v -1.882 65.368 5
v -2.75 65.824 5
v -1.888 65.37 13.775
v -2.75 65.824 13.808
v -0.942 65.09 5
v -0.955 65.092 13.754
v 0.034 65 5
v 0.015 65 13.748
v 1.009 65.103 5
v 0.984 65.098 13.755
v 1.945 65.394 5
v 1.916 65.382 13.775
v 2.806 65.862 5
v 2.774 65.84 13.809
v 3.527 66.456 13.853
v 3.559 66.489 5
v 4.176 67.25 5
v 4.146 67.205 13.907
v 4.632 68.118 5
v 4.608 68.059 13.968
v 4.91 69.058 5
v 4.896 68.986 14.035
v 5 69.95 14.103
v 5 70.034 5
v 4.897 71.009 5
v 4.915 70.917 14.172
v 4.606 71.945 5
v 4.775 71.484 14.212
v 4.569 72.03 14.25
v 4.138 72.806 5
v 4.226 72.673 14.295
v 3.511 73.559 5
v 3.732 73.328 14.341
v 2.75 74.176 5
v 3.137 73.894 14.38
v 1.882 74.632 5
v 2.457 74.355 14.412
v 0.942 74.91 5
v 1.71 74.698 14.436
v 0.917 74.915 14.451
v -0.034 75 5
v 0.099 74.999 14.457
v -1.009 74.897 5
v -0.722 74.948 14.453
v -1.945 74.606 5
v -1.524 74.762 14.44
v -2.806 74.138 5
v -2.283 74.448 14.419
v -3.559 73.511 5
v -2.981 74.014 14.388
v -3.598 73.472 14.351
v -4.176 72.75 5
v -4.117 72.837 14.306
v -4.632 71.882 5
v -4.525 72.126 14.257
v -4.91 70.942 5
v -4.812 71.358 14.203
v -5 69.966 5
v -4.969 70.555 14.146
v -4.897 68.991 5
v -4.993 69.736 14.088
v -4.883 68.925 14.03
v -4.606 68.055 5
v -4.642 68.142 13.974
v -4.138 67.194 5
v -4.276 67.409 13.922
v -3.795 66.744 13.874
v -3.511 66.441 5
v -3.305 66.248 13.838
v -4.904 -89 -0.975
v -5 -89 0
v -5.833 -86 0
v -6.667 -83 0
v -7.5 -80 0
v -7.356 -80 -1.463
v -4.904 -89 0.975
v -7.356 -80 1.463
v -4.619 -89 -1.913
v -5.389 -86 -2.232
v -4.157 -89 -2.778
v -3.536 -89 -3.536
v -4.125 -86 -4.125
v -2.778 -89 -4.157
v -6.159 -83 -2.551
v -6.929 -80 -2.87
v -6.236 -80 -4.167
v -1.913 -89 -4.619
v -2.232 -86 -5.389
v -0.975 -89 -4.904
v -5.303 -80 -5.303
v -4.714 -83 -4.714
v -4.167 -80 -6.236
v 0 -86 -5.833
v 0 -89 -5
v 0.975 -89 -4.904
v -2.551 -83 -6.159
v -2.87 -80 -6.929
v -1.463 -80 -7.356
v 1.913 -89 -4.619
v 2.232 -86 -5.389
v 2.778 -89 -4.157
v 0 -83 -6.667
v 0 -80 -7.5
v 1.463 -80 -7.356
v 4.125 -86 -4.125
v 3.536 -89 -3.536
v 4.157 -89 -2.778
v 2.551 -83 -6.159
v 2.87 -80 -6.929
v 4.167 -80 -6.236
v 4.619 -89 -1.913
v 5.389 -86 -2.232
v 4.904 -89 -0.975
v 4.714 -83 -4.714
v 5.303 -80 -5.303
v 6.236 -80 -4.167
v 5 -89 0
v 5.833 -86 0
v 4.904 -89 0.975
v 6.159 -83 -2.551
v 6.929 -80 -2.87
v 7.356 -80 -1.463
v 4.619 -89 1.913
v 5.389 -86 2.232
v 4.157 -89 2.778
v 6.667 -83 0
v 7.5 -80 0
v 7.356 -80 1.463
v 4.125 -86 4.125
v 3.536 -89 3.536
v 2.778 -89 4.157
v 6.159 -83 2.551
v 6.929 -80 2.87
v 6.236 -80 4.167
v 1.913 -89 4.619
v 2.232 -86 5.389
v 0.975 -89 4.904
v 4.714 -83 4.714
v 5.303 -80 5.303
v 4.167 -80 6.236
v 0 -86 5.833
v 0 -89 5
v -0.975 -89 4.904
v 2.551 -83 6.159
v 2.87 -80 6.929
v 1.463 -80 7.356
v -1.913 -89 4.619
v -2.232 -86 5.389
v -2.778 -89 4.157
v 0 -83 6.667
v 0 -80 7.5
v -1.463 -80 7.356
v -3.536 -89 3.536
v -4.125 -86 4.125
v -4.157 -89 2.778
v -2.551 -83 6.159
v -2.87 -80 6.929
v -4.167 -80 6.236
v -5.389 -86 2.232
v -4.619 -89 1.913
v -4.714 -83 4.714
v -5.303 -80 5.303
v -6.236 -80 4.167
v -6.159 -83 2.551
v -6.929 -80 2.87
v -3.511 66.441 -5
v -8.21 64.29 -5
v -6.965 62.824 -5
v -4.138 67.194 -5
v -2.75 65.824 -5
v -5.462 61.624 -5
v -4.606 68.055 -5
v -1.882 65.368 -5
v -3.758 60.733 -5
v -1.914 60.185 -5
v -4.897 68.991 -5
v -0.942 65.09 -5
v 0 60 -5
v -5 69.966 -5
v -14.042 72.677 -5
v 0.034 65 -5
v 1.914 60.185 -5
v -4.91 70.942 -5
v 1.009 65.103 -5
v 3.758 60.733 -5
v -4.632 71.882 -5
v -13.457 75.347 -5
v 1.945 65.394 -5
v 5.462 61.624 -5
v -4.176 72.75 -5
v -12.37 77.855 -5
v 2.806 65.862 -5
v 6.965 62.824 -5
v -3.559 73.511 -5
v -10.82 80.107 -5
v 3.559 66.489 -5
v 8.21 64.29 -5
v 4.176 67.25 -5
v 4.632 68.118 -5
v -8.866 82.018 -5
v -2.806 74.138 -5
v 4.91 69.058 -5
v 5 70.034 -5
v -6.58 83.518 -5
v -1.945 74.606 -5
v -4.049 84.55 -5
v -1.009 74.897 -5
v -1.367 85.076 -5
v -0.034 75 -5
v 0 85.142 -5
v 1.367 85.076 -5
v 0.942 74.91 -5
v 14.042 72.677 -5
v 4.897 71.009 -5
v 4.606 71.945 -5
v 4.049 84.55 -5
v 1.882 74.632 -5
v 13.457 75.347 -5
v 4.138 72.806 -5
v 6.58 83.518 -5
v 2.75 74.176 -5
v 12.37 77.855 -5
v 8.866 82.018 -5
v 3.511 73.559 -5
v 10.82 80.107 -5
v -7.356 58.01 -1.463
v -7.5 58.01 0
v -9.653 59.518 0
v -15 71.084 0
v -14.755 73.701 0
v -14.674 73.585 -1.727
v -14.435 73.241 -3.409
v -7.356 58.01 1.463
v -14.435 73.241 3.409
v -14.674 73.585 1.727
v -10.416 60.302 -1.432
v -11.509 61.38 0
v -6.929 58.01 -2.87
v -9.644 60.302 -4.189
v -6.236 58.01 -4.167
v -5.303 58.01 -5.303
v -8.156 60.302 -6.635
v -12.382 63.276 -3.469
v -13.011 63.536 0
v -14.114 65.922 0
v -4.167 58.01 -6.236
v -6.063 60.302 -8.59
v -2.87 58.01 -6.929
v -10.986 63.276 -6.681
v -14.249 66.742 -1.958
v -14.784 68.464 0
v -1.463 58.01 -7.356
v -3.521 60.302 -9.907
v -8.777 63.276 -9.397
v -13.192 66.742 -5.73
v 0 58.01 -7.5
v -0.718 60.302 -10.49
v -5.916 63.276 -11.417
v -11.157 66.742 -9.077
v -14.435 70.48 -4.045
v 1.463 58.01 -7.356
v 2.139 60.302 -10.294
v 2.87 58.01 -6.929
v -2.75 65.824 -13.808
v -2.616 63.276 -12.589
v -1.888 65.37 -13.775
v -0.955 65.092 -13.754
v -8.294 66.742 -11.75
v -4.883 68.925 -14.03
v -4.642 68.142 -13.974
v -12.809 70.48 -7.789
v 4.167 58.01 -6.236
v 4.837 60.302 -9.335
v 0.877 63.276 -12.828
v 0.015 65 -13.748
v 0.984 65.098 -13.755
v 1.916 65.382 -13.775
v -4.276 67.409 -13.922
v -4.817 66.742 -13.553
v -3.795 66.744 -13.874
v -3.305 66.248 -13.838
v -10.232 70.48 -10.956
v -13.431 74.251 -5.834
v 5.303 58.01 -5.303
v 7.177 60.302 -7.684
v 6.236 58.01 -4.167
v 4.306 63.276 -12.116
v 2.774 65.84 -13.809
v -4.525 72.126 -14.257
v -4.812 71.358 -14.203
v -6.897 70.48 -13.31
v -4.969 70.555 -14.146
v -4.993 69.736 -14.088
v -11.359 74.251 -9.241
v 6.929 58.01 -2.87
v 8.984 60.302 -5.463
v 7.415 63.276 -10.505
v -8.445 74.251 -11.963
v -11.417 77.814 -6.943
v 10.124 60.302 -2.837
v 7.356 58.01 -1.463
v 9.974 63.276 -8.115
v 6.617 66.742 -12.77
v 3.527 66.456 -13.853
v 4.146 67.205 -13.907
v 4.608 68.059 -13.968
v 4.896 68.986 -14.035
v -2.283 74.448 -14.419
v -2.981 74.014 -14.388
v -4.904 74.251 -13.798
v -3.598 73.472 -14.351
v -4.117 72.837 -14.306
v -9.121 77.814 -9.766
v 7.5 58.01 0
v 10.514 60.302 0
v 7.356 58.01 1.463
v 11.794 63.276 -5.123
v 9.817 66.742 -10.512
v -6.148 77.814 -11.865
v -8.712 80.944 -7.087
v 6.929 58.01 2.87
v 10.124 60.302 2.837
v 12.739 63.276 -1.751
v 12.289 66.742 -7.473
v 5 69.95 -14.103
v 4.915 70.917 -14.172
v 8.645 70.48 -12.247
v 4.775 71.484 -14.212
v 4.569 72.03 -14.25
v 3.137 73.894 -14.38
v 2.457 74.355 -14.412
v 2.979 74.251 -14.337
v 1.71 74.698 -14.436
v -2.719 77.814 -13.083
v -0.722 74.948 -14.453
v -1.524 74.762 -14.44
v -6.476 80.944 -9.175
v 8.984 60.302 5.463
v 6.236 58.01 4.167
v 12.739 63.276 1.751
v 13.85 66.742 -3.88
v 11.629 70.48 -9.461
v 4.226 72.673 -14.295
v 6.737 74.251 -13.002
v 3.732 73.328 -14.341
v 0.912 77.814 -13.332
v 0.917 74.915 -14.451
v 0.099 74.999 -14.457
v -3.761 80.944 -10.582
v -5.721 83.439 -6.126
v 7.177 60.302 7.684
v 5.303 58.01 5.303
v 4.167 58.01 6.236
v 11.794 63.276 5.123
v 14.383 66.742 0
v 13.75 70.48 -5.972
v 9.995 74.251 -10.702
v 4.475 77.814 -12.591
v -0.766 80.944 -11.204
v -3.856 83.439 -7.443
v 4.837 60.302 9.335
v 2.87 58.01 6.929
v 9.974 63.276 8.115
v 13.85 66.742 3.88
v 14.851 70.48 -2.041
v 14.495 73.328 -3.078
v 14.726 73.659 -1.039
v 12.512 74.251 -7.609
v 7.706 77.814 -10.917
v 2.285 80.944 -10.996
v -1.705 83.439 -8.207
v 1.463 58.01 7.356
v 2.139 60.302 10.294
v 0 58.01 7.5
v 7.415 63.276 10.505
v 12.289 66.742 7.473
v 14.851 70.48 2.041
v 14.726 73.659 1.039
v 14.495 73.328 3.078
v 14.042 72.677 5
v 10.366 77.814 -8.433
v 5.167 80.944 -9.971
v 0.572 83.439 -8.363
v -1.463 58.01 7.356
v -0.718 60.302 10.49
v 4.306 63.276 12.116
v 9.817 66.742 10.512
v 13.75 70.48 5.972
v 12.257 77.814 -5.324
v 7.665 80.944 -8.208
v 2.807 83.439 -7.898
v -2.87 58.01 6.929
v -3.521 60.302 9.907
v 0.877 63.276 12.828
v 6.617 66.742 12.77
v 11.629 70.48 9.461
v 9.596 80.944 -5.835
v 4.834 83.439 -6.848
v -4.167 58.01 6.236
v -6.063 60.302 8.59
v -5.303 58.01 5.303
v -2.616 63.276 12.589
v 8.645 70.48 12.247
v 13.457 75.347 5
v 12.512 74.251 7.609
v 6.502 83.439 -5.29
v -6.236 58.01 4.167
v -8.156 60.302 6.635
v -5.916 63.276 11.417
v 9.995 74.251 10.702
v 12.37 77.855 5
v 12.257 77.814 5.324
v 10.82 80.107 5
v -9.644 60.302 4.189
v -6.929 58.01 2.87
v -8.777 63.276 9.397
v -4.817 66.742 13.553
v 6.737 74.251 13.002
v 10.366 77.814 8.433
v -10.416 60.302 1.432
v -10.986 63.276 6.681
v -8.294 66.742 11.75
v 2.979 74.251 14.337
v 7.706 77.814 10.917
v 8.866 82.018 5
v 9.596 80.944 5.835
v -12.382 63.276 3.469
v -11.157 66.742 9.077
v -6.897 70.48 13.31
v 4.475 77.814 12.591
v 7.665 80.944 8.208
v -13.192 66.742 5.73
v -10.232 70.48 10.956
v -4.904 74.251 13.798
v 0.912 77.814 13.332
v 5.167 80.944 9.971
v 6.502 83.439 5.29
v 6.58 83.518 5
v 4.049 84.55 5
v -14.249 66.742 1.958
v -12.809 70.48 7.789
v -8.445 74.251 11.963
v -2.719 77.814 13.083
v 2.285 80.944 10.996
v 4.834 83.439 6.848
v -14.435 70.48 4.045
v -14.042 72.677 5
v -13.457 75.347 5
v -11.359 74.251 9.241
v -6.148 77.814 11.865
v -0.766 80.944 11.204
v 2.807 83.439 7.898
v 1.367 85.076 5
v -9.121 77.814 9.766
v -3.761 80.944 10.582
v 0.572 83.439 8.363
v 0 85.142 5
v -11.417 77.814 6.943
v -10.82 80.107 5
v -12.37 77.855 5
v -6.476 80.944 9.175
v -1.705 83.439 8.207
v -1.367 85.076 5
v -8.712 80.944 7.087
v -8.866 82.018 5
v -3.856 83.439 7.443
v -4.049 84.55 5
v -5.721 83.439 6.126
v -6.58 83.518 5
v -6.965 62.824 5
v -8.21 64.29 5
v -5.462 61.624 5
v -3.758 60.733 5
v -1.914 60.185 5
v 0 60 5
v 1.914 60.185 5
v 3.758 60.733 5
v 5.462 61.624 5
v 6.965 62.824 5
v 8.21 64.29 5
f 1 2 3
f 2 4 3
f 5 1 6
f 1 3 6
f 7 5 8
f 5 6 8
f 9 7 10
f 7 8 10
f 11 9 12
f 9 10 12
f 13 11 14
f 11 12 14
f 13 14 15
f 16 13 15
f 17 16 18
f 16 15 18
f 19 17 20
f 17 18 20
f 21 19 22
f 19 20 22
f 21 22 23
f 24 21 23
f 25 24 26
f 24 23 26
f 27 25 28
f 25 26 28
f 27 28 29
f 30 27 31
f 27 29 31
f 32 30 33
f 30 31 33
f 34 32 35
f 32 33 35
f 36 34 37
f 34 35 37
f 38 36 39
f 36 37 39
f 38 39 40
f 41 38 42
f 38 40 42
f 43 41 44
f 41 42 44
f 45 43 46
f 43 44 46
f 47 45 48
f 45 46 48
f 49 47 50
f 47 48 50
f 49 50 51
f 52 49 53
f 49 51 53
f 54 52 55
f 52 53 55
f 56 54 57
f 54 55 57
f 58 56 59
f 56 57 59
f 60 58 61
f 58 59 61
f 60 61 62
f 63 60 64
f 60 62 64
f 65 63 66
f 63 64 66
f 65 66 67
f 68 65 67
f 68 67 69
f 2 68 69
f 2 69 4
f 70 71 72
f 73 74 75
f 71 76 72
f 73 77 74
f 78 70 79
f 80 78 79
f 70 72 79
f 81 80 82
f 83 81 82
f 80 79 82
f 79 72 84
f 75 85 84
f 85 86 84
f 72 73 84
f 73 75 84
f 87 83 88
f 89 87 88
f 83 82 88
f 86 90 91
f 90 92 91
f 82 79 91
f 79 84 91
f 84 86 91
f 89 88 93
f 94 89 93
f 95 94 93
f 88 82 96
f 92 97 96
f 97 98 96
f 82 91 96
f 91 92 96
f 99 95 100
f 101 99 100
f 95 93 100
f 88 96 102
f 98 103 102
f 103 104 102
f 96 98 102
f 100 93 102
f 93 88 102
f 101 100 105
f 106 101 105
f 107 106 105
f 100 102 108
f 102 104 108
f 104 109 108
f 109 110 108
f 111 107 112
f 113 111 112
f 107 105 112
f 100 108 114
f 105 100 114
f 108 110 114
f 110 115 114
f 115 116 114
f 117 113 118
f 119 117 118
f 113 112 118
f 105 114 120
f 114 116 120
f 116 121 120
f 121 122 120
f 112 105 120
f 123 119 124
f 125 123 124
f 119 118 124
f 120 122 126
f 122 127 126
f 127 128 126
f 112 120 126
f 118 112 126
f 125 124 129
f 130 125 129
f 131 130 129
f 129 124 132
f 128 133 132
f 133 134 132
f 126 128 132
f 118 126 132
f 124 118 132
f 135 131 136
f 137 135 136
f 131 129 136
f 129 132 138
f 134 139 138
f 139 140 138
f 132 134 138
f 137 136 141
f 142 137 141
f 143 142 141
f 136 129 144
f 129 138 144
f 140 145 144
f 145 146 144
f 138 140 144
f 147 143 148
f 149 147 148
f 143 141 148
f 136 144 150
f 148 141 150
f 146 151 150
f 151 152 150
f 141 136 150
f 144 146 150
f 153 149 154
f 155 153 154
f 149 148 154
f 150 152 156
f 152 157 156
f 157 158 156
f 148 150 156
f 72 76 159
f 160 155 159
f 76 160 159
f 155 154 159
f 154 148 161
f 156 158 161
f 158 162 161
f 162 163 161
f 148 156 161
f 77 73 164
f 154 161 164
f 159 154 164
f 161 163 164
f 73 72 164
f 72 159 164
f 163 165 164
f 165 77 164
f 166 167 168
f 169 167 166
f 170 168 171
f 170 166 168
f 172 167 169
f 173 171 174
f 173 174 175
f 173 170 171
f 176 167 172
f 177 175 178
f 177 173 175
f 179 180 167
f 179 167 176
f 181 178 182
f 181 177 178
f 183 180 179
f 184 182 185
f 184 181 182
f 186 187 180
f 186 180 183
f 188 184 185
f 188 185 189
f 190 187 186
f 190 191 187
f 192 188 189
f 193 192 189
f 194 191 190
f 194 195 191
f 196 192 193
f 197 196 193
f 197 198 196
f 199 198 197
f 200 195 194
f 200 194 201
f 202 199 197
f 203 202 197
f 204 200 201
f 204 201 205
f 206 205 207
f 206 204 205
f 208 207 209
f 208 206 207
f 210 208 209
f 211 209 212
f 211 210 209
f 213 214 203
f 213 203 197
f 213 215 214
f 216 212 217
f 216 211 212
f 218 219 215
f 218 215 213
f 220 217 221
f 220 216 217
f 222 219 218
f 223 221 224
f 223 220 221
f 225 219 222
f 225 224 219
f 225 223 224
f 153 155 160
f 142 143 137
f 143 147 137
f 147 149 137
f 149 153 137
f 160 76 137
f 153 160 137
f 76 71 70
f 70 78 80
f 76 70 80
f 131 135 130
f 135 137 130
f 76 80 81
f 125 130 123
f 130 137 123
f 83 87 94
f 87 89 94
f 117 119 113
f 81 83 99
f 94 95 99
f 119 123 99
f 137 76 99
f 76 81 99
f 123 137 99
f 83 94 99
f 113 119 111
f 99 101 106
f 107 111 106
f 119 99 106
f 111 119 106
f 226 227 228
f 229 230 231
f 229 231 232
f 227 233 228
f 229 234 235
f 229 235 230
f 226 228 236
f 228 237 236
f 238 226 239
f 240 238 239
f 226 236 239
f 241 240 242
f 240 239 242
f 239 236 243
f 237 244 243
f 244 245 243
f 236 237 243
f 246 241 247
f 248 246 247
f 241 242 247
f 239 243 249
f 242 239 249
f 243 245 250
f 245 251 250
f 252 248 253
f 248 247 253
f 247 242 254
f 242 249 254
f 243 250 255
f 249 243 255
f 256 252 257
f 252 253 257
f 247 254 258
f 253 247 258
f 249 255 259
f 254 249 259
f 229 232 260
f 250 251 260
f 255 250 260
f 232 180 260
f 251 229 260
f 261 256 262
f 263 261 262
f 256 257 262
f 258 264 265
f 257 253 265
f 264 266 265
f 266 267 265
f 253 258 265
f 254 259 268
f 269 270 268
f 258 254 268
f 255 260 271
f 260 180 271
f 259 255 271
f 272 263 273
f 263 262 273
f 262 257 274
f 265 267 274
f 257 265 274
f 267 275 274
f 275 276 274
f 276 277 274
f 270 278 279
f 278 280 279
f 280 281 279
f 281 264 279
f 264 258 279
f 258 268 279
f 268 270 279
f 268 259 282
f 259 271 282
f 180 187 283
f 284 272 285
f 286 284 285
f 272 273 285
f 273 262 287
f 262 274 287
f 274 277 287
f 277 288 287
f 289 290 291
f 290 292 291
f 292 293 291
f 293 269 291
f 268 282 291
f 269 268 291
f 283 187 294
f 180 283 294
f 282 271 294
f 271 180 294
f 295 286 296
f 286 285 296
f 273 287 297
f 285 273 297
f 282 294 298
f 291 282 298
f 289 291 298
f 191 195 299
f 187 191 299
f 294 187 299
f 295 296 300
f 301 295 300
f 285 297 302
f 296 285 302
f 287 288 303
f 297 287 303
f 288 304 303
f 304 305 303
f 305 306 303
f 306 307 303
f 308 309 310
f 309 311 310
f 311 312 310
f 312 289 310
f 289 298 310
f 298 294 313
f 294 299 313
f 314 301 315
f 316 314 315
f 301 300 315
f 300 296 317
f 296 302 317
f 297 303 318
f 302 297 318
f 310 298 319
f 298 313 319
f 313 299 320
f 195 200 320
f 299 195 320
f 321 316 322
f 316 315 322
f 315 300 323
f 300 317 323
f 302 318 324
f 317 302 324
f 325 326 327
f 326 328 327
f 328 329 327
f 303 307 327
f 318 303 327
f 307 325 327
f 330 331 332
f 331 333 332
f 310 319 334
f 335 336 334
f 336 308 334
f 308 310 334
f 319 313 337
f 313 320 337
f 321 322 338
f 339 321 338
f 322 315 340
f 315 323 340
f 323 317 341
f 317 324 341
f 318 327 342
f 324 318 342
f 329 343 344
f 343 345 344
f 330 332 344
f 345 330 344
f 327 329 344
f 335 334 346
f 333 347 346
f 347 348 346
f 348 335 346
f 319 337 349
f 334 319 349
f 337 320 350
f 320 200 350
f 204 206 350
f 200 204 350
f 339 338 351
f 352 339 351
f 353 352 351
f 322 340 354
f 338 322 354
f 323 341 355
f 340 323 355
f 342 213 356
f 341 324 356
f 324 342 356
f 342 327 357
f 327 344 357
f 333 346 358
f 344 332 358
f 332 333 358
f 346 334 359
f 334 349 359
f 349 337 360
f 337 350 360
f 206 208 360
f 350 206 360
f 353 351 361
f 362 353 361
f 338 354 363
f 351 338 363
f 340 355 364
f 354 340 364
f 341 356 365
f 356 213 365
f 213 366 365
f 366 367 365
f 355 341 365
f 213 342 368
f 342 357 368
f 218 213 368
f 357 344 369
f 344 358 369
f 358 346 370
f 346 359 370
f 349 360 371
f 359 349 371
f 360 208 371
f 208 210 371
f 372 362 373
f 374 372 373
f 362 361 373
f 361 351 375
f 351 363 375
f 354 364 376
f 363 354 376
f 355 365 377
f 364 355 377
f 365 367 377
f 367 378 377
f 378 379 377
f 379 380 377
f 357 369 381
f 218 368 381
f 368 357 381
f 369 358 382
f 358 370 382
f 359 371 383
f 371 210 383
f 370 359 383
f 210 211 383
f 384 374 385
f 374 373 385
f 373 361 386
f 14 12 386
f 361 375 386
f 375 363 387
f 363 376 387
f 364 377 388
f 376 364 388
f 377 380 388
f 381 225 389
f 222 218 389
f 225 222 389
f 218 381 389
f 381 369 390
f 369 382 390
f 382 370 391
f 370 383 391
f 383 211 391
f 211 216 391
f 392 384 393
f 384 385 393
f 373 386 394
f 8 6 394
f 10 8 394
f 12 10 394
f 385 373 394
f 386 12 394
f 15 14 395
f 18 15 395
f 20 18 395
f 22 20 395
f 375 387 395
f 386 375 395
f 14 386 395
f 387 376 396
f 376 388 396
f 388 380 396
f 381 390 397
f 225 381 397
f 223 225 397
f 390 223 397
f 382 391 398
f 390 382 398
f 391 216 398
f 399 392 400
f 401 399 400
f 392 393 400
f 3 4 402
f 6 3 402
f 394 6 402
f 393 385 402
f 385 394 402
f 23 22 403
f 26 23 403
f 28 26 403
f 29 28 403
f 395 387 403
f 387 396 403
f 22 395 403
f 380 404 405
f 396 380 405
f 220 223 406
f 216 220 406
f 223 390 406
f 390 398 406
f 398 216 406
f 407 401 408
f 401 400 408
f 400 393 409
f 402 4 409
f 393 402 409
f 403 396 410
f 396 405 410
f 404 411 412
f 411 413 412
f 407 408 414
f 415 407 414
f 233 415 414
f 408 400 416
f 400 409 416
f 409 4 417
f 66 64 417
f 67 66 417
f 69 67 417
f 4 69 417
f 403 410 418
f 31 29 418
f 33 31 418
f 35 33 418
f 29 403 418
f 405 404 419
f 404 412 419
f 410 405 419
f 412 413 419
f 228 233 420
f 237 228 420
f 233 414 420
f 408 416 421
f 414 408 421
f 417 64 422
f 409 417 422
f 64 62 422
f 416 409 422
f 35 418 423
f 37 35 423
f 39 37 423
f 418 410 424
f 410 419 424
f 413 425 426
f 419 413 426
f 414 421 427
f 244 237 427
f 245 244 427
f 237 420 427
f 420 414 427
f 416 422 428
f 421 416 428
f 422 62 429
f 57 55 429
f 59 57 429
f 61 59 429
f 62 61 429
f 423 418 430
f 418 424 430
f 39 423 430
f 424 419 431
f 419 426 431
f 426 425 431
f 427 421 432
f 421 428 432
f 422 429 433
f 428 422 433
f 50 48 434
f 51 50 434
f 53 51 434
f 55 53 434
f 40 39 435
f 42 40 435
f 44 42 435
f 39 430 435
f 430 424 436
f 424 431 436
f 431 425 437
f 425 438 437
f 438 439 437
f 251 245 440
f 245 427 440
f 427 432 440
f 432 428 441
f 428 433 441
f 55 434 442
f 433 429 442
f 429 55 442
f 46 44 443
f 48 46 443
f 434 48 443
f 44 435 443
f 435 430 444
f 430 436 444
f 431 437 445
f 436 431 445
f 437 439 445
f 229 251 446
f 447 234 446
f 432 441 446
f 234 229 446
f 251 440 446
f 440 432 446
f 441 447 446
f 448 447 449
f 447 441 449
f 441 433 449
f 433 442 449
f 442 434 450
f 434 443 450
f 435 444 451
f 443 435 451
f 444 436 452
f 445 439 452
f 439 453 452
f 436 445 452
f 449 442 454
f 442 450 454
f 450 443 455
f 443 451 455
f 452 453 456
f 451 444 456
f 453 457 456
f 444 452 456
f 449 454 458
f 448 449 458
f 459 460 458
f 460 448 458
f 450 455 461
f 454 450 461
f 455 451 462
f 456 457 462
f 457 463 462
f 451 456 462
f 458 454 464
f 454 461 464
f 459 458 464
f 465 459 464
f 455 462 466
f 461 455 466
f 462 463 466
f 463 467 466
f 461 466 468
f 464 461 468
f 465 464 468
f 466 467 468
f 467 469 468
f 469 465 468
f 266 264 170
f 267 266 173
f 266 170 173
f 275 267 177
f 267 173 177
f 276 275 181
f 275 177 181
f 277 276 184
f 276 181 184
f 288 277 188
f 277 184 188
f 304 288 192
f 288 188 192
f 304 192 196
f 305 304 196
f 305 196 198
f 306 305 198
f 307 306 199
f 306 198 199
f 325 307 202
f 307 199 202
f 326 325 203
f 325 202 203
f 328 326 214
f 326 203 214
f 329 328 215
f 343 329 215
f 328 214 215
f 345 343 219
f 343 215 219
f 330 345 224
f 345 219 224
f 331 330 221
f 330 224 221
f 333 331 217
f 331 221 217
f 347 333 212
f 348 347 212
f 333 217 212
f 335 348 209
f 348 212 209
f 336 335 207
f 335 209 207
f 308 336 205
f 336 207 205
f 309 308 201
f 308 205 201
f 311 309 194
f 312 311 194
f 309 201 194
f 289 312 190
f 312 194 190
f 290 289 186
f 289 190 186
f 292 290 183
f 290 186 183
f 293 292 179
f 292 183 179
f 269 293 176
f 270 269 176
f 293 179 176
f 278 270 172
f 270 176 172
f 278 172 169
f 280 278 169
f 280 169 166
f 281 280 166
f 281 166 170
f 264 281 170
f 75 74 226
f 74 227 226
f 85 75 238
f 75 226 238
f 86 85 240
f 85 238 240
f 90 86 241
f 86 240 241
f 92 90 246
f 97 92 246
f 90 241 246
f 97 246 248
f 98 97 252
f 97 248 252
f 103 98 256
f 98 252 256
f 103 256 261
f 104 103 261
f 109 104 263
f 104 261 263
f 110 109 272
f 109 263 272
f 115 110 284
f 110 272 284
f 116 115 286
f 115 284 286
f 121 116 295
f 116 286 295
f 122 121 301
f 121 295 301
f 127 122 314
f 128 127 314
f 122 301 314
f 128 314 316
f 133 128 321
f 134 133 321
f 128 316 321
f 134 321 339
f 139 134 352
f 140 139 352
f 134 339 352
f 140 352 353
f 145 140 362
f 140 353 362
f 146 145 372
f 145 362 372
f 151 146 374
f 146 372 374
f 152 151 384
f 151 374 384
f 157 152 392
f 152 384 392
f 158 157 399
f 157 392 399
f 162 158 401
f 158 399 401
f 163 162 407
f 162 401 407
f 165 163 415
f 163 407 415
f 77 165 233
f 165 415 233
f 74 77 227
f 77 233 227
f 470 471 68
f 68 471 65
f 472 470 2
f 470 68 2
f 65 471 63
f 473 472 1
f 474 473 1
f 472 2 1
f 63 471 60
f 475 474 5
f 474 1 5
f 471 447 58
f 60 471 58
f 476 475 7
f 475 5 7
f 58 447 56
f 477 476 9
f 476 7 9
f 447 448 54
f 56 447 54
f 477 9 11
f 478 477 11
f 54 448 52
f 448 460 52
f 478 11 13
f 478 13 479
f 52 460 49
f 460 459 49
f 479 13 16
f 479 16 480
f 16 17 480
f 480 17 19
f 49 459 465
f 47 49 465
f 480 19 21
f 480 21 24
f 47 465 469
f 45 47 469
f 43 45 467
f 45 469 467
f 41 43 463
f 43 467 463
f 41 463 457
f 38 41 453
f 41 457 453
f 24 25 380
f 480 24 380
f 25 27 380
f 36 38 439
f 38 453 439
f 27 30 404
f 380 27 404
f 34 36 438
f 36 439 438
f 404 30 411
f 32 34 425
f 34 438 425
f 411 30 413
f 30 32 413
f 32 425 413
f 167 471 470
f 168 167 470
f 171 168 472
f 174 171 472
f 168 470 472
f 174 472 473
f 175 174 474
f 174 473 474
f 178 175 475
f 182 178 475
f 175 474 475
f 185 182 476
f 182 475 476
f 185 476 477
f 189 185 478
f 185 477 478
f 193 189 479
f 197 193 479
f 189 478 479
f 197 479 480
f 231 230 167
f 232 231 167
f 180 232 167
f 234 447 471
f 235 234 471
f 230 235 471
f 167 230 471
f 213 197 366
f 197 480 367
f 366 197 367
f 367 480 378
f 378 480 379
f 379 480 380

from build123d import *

# Parameters (mm, degrees)
SKETCH2_R          = 5
CUT_EXTRUDE1_DEPTH = 20
CUT_EXTRUDE2_DEPTH = 5


with BuildPart() as part:
    # Sketch1 → Base-Revolve (revolve)
    with BuildSketch(Plane.XY, mode=Mode.PRIVATE) as base_revolve_sk:
        with BuildLine():
            Line((0, -89), (5, -89))
            Line((5, -89), (7.5, -80))
            Line((7.5, -80), (7.5, 58.009618943))
            ThreePointArc((7.5, 58.009618943), (14.488887394, 74.882285677), (0, 86))
            Line((0, 86), (0, -89))
        make_face()
    revolve(base_revolve_sk.sketch.rotate(Axis((0, 111, 0), (0, -1, 0)), 180), axis=Axis((0, 111, 0), (0, -1, 0)))

    # Sketch2 → Cut-Extrude1 (cut, symmetric)
    with BuildSketch(Plane.XY):
        with Locations(Location((0, 70, 0), (0, 0, 236.639256329))):
            Circle(SKETCH2_R)
    extrude(amount=CUT_EXTRUDE1_DEPTH, both=True, mode=Mode.SUBTRACT)

    # Sketch3 → Cut-Extrude2 (cut, symmetric)
    with BuildSketch(Plane.XY):
        with BuildLine():
            Line((40, 110), (-40, 110))
            Line((-40, 110), (-8.209705454, 64.290294546))
            ThreePointArc((-8.209705454, 64.290294546), (0, 60), (8.209705454, 64.290294546))
            Line((8.209705454, 64.290294546), (40, 110))
        make_face()
    extrude(amount=CUT_EXTRUDE2_DEPTH, both=True, mode=Mode.SUBTRACT)


solid = part.part
